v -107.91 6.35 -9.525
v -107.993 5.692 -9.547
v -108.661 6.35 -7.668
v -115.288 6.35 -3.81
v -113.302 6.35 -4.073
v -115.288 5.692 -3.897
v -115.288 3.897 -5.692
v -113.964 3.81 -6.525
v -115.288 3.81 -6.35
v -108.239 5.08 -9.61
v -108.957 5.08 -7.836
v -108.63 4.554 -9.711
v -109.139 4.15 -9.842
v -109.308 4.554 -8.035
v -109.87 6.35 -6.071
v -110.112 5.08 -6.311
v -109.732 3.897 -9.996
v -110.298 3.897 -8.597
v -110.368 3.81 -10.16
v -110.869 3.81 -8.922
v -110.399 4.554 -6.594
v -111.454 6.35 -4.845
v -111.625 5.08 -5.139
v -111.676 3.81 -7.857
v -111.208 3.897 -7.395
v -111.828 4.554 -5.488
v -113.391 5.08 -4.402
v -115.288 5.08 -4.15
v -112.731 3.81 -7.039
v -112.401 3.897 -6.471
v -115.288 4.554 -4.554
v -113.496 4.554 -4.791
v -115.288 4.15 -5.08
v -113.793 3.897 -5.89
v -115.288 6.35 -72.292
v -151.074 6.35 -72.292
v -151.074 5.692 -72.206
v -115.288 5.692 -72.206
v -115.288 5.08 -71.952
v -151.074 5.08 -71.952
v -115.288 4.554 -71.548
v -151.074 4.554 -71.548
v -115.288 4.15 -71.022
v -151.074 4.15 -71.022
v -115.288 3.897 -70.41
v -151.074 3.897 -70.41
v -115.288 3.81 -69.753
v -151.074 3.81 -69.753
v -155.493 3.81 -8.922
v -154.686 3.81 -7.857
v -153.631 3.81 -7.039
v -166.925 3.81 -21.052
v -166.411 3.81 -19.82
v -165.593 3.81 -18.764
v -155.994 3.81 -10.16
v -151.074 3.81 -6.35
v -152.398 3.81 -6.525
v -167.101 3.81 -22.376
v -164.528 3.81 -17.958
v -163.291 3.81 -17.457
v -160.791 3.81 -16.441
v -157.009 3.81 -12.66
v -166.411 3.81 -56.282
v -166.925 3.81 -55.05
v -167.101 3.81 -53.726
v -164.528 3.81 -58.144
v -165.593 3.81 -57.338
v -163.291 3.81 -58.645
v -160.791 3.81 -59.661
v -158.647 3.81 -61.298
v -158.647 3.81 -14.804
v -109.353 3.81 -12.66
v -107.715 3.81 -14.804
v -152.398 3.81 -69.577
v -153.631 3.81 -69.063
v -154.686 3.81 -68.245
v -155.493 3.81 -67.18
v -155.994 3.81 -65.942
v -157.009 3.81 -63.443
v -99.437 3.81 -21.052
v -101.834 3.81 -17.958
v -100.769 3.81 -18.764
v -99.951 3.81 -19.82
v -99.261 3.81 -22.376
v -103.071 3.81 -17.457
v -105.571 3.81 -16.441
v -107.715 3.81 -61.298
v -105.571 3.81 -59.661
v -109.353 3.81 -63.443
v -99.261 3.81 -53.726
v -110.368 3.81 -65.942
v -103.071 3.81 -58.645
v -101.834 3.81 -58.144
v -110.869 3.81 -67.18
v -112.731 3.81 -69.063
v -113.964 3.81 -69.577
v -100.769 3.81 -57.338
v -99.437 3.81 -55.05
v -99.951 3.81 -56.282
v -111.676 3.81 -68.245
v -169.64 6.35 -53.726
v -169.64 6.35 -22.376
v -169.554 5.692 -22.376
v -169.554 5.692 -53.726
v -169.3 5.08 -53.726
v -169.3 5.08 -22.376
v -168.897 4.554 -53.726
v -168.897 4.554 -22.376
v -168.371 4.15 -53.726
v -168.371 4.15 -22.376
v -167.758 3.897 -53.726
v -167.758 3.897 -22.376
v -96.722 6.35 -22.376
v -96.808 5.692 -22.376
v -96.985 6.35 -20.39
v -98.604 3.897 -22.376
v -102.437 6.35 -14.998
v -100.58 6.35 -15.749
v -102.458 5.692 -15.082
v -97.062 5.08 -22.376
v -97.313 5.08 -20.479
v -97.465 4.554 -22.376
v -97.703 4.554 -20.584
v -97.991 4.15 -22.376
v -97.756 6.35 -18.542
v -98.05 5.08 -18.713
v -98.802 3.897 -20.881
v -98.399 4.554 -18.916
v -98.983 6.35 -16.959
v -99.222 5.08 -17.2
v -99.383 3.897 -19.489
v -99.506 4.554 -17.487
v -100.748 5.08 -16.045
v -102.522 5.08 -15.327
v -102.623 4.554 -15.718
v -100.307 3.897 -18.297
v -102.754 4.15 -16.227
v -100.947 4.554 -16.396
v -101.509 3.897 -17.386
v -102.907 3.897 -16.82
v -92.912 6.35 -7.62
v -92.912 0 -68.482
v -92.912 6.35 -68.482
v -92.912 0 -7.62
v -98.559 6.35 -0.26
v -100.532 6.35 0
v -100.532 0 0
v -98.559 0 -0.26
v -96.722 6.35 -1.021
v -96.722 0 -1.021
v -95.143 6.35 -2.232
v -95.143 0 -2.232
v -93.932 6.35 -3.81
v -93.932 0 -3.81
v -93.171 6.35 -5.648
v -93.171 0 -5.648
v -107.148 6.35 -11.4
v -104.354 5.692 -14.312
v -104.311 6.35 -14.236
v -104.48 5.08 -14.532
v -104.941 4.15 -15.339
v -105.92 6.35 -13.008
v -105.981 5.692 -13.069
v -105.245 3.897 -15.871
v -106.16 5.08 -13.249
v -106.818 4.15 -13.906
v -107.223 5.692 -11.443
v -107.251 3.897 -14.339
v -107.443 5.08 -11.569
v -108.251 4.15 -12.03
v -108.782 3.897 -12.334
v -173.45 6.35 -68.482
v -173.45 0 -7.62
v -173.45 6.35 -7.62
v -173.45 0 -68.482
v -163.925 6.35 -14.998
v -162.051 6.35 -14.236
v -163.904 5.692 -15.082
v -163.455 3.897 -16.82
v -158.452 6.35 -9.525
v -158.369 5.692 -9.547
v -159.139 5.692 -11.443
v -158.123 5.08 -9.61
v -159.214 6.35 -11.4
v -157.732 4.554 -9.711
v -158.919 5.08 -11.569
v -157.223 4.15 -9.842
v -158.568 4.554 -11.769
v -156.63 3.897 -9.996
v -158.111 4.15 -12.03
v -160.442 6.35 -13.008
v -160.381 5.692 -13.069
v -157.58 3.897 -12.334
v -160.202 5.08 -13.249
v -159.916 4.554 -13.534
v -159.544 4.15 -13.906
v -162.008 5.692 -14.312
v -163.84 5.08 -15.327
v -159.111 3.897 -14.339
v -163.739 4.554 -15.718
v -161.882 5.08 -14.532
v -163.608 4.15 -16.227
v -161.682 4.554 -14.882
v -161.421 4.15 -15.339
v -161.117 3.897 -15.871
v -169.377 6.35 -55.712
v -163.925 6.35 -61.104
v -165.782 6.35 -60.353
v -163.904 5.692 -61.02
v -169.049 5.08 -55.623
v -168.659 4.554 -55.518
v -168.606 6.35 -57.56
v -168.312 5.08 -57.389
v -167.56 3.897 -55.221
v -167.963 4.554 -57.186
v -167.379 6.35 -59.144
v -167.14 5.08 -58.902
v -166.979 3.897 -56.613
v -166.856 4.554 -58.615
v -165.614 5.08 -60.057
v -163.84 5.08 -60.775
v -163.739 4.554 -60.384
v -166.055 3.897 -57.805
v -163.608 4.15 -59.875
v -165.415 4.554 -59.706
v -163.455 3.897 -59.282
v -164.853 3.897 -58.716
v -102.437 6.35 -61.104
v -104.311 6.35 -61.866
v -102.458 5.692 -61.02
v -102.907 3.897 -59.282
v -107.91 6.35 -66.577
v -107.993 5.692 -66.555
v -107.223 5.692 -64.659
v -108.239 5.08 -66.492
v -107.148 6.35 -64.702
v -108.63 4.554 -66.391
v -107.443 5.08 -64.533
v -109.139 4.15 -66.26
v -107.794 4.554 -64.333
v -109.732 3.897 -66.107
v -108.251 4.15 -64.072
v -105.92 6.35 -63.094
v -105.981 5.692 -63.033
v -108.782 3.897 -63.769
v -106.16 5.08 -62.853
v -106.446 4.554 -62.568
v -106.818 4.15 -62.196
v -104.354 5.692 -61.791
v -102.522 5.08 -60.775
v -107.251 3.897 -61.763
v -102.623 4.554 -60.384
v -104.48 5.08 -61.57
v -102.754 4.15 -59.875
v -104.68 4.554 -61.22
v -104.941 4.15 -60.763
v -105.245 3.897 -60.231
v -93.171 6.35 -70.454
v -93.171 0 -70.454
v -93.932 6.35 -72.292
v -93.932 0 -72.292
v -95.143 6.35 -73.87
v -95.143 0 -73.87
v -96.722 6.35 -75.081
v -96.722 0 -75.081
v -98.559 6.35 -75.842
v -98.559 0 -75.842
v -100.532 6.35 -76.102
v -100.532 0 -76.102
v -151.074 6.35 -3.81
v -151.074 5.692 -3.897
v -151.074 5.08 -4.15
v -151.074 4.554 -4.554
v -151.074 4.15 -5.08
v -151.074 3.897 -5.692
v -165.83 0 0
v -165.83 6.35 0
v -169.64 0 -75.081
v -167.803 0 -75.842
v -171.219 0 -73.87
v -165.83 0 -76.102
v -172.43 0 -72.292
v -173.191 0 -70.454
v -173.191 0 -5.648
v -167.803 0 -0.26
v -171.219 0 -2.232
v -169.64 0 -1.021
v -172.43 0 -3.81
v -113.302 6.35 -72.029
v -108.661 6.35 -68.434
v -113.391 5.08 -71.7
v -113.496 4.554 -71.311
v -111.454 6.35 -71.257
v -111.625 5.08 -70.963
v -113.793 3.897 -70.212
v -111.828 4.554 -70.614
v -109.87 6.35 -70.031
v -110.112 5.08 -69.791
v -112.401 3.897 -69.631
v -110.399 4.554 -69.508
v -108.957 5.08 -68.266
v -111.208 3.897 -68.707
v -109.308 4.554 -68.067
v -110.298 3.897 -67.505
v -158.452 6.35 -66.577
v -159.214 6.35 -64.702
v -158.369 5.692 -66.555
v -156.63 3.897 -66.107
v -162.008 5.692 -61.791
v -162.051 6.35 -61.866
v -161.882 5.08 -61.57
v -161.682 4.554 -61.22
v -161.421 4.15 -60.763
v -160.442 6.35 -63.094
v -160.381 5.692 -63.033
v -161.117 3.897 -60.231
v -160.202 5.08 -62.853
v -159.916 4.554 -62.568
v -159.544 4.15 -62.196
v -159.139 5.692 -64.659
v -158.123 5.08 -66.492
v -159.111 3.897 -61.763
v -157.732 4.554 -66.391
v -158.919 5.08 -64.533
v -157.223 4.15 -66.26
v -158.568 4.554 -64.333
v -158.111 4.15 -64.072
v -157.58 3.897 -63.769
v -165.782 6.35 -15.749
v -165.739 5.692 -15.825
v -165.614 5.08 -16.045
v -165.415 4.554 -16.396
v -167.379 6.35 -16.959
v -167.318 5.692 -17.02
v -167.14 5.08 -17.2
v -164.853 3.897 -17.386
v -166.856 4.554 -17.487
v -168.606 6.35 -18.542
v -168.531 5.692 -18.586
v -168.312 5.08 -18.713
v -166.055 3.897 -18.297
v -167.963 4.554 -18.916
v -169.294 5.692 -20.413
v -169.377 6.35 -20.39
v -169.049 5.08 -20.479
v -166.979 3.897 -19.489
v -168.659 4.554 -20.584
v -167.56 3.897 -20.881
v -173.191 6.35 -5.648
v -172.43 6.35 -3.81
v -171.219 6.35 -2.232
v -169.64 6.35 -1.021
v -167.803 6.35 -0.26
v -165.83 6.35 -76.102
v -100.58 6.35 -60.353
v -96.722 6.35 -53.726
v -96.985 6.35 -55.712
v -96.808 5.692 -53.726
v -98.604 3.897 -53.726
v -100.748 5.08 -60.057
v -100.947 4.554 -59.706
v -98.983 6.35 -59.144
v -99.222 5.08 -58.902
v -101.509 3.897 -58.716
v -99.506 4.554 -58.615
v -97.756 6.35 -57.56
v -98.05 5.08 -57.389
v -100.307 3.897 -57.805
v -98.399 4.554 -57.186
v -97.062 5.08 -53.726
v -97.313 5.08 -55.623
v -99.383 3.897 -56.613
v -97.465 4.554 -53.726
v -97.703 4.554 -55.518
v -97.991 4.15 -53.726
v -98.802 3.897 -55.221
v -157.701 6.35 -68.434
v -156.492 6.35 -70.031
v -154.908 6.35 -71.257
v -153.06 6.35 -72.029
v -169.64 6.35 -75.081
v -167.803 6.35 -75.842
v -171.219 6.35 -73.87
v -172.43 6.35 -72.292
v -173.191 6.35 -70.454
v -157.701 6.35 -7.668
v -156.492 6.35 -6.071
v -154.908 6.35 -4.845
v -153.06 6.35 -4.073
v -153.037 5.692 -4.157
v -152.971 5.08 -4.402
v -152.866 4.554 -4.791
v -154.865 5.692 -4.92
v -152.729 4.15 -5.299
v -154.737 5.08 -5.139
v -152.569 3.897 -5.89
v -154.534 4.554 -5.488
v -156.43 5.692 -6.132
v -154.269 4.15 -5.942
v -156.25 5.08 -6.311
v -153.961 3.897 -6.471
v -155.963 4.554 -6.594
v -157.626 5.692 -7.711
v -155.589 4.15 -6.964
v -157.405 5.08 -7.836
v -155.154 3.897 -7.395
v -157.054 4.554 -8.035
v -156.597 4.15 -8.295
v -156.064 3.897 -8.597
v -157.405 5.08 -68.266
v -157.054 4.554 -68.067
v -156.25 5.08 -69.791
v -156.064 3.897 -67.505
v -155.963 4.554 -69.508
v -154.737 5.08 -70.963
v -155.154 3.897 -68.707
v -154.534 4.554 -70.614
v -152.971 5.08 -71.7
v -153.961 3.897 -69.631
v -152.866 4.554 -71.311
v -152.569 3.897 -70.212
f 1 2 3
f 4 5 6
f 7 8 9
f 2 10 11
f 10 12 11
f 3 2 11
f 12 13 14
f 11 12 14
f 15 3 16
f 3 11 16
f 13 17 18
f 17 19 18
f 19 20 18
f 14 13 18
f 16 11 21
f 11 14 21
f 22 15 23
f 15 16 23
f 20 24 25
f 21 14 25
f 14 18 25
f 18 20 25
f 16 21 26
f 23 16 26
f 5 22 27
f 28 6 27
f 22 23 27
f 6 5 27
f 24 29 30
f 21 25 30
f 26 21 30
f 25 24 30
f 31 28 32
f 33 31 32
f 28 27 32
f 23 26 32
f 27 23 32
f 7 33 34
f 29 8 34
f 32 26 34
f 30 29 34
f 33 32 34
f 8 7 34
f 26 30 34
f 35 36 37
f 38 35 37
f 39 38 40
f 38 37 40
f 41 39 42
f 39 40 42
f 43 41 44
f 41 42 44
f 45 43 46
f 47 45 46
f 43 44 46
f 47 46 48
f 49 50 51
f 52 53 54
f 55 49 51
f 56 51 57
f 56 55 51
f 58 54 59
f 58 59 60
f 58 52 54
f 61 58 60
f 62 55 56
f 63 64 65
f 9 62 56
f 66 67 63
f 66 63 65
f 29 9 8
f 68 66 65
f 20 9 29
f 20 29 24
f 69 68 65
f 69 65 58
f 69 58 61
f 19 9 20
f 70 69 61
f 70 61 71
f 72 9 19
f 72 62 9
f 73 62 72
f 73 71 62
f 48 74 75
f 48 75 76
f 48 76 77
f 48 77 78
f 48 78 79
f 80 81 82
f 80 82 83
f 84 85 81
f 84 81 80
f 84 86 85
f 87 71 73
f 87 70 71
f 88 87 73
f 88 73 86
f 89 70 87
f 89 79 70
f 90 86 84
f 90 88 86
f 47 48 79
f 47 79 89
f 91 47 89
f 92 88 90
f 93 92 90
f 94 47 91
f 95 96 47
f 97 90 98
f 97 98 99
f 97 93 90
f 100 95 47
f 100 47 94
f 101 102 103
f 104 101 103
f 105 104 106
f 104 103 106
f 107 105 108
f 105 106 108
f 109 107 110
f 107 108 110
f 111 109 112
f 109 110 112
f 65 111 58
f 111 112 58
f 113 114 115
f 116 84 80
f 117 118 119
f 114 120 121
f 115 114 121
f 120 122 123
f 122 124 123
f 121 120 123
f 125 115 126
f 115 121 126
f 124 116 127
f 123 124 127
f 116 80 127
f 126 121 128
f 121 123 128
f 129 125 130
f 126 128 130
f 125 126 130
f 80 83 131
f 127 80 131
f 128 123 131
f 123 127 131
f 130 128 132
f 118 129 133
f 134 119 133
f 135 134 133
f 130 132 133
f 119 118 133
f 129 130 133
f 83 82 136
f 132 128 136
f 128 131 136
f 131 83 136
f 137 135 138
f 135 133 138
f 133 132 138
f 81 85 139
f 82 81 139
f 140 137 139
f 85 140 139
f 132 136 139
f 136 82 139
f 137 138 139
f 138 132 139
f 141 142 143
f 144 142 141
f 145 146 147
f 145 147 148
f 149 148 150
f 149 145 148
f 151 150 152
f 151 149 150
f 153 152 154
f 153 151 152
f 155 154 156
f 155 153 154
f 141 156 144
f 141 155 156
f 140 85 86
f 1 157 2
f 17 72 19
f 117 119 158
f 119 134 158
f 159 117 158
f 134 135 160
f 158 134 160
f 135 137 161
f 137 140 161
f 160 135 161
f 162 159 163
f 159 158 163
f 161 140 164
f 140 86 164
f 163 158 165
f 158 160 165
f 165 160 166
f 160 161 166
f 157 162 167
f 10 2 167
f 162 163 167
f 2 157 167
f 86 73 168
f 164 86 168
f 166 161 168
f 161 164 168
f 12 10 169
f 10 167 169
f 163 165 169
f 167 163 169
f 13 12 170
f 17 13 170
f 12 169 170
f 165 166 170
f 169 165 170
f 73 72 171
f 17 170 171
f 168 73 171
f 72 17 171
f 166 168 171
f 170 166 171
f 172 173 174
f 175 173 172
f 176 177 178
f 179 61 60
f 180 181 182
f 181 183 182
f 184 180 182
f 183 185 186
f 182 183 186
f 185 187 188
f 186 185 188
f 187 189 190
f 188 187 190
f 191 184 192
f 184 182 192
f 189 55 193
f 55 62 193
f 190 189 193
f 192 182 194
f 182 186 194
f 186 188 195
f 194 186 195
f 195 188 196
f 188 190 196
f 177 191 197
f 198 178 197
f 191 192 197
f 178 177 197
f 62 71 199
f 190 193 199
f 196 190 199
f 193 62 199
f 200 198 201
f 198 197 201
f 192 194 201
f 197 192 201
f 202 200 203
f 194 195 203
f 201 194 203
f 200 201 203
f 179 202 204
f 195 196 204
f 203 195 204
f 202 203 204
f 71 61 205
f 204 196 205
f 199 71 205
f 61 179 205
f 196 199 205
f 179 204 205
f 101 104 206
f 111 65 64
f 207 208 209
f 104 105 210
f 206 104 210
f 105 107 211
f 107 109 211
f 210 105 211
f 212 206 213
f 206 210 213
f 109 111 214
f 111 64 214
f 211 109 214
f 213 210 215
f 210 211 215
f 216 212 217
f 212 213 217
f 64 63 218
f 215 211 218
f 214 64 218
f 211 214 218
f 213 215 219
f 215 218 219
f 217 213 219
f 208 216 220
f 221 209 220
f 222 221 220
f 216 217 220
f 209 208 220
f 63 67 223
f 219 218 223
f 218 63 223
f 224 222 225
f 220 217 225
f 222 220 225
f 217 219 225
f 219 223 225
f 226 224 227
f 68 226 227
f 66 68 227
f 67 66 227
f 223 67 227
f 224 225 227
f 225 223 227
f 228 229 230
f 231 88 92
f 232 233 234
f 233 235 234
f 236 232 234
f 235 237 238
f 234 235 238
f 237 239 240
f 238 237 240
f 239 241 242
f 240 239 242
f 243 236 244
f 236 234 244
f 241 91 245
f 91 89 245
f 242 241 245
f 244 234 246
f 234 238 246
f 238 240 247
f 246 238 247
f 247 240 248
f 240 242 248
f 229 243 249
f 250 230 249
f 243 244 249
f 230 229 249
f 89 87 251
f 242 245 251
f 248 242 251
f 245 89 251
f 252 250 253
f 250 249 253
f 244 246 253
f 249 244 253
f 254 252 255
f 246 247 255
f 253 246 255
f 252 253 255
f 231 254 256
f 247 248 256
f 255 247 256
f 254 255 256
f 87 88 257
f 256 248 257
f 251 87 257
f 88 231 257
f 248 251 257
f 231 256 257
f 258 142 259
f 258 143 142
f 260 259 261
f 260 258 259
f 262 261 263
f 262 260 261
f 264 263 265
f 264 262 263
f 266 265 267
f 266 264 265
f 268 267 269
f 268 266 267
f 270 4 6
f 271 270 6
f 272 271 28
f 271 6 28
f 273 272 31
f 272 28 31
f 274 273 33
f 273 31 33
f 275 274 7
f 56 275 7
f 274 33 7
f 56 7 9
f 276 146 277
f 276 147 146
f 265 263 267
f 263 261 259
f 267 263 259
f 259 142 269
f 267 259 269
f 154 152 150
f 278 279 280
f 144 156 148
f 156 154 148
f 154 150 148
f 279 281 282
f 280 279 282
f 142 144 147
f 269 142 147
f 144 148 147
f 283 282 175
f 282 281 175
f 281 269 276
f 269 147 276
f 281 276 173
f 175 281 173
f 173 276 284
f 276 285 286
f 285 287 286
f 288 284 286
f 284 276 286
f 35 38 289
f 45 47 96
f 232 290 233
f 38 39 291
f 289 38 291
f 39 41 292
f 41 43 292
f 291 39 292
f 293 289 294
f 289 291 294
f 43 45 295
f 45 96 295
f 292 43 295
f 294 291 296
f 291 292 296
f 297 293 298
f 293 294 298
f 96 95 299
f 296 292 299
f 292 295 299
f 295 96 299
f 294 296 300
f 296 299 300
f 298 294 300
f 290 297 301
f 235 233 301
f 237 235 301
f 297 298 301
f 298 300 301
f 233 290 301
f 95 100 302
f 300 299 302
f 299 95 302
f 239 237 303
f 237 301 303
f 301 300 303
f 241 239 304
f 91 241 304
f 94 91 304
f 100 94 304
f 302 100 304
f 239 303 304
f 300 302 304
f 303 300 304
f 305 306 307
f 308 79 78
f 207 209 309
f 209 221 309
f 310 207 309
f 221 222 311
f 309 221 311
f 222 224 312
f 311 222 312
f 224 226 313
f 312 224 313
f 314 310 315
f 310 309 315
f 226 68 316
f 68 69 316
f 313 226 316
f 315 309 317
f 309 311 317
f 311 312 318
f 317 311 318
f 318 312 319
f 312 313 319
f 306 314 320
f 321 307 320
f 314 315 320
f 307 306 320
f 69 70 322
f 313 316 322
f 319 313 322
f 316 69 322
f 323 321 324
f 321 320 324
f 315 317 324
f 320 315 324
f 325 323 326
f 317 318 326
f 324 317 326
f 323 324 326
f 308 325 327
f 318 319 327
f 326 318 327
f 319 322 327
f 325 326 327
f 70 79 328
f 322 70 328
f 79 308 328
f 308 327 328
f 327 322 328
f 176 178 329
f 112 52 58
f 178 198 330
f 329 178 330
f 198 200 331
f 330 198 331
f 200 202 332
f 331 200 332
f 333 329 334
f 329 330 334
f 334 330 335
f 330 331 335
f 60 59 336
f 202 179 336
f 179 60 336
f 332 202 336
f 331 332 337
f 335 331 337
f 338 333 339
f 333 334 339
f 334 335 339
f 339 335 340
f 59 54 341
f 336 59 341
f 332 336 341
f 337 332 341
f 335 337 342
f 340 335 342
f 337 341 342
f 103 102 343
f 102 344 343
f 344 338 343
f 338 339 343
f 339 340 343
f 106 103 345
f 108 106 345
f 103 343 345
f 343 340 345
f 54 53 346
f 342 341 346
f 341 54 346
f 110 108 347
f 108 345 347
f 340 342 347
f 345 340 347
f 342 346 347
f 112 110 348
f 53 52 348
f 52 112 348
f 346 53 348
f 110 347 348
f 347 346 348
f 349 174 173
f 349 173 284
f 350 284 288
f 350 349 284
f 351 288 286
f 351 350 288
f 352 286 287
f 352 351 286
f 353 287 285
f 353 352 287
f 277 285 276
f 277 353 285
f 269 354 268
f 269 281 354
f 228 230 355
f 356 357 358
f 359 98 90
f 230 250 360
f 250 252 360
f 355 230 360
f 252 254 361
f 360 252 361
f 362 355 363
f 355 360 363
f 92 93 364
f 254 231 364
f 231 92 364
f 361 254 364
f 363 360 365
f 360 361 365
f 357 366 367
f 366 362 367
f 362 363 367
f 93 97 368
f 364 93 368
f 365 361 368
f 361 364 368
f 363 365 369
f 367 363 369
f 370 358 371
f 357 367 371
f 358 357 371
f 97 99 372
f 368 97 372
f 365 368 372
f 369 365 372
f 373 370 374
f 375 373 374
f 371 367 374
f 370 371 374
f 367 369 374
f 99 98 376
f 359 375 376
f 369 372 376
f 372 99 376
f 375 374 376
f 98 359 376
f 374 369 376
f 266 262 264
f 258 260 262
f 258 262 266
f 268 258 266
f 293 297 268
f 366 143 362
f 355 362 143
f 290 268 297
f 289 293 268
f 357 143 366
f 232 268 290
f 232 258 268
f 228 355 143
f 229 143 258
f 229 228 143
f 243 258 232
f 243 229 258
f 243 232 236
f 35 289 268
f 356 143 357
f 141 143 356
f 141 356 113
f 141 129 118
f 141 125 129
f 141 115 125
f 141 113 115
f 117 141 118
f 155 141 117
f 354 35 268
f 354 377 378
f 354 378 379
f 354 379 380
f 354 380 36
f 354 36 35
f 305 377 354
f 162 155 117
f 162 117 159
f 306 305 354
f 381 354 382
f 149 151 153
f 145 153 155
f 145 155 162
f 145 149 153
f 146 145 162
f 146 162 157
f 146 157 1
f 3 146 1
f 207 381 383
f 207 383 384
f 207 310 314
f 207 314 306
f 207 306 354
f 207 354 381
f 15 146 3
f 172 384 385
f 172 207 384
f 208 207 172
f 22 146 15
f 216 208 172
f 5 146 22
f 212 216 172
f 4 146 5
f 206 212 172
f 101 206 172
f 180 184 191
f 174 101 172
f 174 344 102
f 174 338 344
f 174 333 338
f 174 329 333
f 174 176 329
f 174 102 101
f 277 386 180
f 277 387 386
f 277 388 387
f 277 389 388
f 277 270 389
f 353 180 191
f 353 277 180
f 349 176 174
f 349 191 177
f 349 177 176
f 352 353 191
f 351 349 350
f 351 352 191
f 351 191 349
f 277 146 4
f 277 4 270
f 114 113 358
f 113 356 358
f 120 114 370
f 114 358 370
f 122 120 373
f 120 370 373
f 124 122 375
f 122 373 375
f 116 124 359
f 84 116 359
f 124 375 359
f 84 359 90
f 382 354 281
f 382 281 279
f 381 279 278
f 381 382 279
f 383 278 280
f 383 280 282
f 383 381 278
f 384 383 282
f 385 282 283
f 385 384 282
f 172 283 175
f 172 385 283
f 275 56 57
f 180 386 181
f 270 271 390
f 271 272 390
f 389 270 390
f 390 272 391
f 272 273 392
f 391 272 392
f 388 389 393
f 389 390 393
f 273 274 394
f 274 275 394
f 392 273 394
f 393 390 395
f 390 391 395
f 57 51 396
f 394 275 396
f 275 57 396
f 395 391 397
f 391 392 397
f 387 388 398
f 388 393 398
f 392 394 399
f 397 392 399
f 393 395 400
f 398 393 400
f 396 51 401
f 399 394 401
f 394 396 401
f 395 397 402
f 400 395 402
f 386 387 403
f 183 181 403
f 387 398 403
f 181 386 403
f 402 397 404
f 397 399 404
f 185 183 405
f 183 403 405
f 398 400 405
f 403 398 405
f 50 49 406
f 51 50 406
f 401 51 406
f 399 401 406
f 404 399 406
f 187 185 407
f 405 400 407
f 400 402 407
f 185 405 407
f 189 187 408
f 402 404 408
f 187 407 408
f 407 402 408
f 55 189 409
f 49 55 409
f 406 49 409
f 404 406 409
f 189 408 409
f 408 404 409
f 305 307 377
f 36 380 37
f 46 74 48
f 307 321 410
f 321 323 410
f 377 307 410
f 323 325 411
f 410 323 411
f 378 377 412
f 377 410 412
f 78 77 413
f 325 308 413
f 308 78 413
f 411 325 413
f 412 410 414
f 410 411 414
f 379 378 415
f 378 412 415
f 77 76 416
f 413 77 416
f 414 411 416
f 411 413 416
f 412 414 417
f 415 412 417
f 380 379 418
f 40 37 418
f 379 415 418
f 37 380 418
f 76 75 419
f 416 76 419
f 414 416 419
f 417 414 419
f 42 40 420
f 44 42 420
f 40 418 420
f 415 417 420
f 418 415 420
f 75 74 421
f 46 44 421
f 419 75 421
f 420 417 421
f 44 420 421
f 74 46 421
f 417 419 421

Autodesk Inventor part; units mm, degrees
ref_plane "YZ Plane" through (0, 0, 0) normal (1, 0, 0) x (0, 1, 0)
ref_plane "XZ Plane" through (0, 0, 0) normal (0, 1, 0) x (-1, 0, 0)
ref_plane "XY Plane" through (0, 0, 0) normal (0, 0, 1) x (1, 0, 0)
sketch "Sketch1" plane through (0, 0, 0) normal (0, 1, 0) x (-1, 0, 0)
  line L0 (173.4504, -76.1021) -> (92.9116, -76.1021)
  line L1 (92.9116, -76.1021) -> (92.9116, 0)
  line L2 (92.9116, 0) -> (173.4504, 0)
  line L3 (173.4504, 0) -> (173.4504, -76.1021)
  point P0 (0, 0)
extrude "Extrusion1" add sketch "Sketch1" along normal blind 6.35
fillet "Fillet1" radius 7.62 4 edges at (-173.4504, 3.175, 0) (-173.4504, 3.175, -76.1021) (-92.9116, 3.175, -76.1021) (-92.9116, 3.175, 0)
sketch "Sketch2" plane through (0, 6.35, 0) normal (0, 1, 0) x (1, 0, 0)
  arc A0 (-165.8304, 76.1021) -> (-173.4504, 68.4821) centre (-165.8304, 68.4821) ccw projected
  line L0 (-100.5316, 76.1021) -> (-165.8304, 76.1021) projected
  circle A1 centre (-165.8304, 68.4821) radius 7.62
  arc A2 (-173.4504, 7.62) -> (-165.8304, 0) centre (-165.8304, 7.62) ccw projected
  circle A3 centre (-165.8304, 7.62) radius 7.62
  arc A4 (-100.5316, 0) -> (-92.9116, 7.62) centre (-100.5316, 7.62) ccw projected
  circle A5 centre (-100.5316, 7.62) radius 7.62
  arc A6 (-92.9116, 68.4821) -> (-100.5316, 76.1021) centre (-100.5316, 68.4821) ccw projected
  circle A7 centre (-100.5316, 68.4821) radius 7.62
  line L1 (-169.6404, 72.2921) -> (-96.7216, 72.2921)
  line L2 (-96.7216, 72.2921) -> (-96.7216, 3.81)
  line L3 (-96.7216, 3.81) -> (-169.6404, 3.81)
  line L4 (-169.6404, 3.81) -> (-169.6404, 72.2921)
  line L5 (-173.4504, 68.4821) -> (-173.4504, 7.62) projected
  point P0 (0, 0)
  point P1 (-169.6404, 38.051)
  point P2 (-173.4504, 38.051)
  point P3 (-133.181, 72.2921)
  point P4 (-133.181, 76.1021)
  point P5 (-169.6404, 61.8829)
  point P6 (-169.6404, 14.2191)
  point P7 (-159.2312, 3.81)
  point P8 (-107.1307, 3.81)
  point P9 (-96.7216, 14.2191)
  point P10 (-96.7216, 61.8829)
  point P11 (-107.1307, 72.2921)
  point P12 (-159.2312, 72.2921)
  dimension "d3" = 3.81
  dimension "d4" = 3.81
extrude "Extrusion2" cut sketch "Sketch2" against normal blind 2.54 contours L1 A7 L2 A5 L3 A3 L4 A1
fillet "Fillet2" radius 7.62 8 edges at (-169.6404, 5.08, -14.2191) (-159.2312, 5.08, -3.81) (-169.6404, 5.08, -61.8829) (-159.2312, 5.08, -72.2921) (-107.1307, 5.08, -72.2921) (-96.7216, 5.08, -61.8829) (-96.7216, 5.08, -14.2191) (-107.1307, 5.08, -3.81)
fillet "Fillet3" radius 2.54 16 edges at (-155.7406, 3.81, -5.4059) (-160.4422, 3.81, -13.0082) (-168.0445, 3.81, -17.7098) (-169.6404, 3.81, -38.051) (-168.0445, 3.81, -58.3923) (-160.4422, 3.81, -63.0939) (-155.7406, 3.81, -70.6962) (-133.181, 3.81, -72.2921) (-110.6214, 3.81, -70.6962) (-105.9198, 3.81, -63.0939) (-98.3175, 3.81, -58.3923) (-96.7216, 3.81, -38.051) (-98.3175, 3.81, -17.7098) (-105.9198, 3.81, -13.0082) (-110.6214, 3.81, -5.4059) (-133.181, 3.81, -3.81)
equation "\"d4\" = d3"
properties part number "Machined Lid" material "Aluminum 6061"
